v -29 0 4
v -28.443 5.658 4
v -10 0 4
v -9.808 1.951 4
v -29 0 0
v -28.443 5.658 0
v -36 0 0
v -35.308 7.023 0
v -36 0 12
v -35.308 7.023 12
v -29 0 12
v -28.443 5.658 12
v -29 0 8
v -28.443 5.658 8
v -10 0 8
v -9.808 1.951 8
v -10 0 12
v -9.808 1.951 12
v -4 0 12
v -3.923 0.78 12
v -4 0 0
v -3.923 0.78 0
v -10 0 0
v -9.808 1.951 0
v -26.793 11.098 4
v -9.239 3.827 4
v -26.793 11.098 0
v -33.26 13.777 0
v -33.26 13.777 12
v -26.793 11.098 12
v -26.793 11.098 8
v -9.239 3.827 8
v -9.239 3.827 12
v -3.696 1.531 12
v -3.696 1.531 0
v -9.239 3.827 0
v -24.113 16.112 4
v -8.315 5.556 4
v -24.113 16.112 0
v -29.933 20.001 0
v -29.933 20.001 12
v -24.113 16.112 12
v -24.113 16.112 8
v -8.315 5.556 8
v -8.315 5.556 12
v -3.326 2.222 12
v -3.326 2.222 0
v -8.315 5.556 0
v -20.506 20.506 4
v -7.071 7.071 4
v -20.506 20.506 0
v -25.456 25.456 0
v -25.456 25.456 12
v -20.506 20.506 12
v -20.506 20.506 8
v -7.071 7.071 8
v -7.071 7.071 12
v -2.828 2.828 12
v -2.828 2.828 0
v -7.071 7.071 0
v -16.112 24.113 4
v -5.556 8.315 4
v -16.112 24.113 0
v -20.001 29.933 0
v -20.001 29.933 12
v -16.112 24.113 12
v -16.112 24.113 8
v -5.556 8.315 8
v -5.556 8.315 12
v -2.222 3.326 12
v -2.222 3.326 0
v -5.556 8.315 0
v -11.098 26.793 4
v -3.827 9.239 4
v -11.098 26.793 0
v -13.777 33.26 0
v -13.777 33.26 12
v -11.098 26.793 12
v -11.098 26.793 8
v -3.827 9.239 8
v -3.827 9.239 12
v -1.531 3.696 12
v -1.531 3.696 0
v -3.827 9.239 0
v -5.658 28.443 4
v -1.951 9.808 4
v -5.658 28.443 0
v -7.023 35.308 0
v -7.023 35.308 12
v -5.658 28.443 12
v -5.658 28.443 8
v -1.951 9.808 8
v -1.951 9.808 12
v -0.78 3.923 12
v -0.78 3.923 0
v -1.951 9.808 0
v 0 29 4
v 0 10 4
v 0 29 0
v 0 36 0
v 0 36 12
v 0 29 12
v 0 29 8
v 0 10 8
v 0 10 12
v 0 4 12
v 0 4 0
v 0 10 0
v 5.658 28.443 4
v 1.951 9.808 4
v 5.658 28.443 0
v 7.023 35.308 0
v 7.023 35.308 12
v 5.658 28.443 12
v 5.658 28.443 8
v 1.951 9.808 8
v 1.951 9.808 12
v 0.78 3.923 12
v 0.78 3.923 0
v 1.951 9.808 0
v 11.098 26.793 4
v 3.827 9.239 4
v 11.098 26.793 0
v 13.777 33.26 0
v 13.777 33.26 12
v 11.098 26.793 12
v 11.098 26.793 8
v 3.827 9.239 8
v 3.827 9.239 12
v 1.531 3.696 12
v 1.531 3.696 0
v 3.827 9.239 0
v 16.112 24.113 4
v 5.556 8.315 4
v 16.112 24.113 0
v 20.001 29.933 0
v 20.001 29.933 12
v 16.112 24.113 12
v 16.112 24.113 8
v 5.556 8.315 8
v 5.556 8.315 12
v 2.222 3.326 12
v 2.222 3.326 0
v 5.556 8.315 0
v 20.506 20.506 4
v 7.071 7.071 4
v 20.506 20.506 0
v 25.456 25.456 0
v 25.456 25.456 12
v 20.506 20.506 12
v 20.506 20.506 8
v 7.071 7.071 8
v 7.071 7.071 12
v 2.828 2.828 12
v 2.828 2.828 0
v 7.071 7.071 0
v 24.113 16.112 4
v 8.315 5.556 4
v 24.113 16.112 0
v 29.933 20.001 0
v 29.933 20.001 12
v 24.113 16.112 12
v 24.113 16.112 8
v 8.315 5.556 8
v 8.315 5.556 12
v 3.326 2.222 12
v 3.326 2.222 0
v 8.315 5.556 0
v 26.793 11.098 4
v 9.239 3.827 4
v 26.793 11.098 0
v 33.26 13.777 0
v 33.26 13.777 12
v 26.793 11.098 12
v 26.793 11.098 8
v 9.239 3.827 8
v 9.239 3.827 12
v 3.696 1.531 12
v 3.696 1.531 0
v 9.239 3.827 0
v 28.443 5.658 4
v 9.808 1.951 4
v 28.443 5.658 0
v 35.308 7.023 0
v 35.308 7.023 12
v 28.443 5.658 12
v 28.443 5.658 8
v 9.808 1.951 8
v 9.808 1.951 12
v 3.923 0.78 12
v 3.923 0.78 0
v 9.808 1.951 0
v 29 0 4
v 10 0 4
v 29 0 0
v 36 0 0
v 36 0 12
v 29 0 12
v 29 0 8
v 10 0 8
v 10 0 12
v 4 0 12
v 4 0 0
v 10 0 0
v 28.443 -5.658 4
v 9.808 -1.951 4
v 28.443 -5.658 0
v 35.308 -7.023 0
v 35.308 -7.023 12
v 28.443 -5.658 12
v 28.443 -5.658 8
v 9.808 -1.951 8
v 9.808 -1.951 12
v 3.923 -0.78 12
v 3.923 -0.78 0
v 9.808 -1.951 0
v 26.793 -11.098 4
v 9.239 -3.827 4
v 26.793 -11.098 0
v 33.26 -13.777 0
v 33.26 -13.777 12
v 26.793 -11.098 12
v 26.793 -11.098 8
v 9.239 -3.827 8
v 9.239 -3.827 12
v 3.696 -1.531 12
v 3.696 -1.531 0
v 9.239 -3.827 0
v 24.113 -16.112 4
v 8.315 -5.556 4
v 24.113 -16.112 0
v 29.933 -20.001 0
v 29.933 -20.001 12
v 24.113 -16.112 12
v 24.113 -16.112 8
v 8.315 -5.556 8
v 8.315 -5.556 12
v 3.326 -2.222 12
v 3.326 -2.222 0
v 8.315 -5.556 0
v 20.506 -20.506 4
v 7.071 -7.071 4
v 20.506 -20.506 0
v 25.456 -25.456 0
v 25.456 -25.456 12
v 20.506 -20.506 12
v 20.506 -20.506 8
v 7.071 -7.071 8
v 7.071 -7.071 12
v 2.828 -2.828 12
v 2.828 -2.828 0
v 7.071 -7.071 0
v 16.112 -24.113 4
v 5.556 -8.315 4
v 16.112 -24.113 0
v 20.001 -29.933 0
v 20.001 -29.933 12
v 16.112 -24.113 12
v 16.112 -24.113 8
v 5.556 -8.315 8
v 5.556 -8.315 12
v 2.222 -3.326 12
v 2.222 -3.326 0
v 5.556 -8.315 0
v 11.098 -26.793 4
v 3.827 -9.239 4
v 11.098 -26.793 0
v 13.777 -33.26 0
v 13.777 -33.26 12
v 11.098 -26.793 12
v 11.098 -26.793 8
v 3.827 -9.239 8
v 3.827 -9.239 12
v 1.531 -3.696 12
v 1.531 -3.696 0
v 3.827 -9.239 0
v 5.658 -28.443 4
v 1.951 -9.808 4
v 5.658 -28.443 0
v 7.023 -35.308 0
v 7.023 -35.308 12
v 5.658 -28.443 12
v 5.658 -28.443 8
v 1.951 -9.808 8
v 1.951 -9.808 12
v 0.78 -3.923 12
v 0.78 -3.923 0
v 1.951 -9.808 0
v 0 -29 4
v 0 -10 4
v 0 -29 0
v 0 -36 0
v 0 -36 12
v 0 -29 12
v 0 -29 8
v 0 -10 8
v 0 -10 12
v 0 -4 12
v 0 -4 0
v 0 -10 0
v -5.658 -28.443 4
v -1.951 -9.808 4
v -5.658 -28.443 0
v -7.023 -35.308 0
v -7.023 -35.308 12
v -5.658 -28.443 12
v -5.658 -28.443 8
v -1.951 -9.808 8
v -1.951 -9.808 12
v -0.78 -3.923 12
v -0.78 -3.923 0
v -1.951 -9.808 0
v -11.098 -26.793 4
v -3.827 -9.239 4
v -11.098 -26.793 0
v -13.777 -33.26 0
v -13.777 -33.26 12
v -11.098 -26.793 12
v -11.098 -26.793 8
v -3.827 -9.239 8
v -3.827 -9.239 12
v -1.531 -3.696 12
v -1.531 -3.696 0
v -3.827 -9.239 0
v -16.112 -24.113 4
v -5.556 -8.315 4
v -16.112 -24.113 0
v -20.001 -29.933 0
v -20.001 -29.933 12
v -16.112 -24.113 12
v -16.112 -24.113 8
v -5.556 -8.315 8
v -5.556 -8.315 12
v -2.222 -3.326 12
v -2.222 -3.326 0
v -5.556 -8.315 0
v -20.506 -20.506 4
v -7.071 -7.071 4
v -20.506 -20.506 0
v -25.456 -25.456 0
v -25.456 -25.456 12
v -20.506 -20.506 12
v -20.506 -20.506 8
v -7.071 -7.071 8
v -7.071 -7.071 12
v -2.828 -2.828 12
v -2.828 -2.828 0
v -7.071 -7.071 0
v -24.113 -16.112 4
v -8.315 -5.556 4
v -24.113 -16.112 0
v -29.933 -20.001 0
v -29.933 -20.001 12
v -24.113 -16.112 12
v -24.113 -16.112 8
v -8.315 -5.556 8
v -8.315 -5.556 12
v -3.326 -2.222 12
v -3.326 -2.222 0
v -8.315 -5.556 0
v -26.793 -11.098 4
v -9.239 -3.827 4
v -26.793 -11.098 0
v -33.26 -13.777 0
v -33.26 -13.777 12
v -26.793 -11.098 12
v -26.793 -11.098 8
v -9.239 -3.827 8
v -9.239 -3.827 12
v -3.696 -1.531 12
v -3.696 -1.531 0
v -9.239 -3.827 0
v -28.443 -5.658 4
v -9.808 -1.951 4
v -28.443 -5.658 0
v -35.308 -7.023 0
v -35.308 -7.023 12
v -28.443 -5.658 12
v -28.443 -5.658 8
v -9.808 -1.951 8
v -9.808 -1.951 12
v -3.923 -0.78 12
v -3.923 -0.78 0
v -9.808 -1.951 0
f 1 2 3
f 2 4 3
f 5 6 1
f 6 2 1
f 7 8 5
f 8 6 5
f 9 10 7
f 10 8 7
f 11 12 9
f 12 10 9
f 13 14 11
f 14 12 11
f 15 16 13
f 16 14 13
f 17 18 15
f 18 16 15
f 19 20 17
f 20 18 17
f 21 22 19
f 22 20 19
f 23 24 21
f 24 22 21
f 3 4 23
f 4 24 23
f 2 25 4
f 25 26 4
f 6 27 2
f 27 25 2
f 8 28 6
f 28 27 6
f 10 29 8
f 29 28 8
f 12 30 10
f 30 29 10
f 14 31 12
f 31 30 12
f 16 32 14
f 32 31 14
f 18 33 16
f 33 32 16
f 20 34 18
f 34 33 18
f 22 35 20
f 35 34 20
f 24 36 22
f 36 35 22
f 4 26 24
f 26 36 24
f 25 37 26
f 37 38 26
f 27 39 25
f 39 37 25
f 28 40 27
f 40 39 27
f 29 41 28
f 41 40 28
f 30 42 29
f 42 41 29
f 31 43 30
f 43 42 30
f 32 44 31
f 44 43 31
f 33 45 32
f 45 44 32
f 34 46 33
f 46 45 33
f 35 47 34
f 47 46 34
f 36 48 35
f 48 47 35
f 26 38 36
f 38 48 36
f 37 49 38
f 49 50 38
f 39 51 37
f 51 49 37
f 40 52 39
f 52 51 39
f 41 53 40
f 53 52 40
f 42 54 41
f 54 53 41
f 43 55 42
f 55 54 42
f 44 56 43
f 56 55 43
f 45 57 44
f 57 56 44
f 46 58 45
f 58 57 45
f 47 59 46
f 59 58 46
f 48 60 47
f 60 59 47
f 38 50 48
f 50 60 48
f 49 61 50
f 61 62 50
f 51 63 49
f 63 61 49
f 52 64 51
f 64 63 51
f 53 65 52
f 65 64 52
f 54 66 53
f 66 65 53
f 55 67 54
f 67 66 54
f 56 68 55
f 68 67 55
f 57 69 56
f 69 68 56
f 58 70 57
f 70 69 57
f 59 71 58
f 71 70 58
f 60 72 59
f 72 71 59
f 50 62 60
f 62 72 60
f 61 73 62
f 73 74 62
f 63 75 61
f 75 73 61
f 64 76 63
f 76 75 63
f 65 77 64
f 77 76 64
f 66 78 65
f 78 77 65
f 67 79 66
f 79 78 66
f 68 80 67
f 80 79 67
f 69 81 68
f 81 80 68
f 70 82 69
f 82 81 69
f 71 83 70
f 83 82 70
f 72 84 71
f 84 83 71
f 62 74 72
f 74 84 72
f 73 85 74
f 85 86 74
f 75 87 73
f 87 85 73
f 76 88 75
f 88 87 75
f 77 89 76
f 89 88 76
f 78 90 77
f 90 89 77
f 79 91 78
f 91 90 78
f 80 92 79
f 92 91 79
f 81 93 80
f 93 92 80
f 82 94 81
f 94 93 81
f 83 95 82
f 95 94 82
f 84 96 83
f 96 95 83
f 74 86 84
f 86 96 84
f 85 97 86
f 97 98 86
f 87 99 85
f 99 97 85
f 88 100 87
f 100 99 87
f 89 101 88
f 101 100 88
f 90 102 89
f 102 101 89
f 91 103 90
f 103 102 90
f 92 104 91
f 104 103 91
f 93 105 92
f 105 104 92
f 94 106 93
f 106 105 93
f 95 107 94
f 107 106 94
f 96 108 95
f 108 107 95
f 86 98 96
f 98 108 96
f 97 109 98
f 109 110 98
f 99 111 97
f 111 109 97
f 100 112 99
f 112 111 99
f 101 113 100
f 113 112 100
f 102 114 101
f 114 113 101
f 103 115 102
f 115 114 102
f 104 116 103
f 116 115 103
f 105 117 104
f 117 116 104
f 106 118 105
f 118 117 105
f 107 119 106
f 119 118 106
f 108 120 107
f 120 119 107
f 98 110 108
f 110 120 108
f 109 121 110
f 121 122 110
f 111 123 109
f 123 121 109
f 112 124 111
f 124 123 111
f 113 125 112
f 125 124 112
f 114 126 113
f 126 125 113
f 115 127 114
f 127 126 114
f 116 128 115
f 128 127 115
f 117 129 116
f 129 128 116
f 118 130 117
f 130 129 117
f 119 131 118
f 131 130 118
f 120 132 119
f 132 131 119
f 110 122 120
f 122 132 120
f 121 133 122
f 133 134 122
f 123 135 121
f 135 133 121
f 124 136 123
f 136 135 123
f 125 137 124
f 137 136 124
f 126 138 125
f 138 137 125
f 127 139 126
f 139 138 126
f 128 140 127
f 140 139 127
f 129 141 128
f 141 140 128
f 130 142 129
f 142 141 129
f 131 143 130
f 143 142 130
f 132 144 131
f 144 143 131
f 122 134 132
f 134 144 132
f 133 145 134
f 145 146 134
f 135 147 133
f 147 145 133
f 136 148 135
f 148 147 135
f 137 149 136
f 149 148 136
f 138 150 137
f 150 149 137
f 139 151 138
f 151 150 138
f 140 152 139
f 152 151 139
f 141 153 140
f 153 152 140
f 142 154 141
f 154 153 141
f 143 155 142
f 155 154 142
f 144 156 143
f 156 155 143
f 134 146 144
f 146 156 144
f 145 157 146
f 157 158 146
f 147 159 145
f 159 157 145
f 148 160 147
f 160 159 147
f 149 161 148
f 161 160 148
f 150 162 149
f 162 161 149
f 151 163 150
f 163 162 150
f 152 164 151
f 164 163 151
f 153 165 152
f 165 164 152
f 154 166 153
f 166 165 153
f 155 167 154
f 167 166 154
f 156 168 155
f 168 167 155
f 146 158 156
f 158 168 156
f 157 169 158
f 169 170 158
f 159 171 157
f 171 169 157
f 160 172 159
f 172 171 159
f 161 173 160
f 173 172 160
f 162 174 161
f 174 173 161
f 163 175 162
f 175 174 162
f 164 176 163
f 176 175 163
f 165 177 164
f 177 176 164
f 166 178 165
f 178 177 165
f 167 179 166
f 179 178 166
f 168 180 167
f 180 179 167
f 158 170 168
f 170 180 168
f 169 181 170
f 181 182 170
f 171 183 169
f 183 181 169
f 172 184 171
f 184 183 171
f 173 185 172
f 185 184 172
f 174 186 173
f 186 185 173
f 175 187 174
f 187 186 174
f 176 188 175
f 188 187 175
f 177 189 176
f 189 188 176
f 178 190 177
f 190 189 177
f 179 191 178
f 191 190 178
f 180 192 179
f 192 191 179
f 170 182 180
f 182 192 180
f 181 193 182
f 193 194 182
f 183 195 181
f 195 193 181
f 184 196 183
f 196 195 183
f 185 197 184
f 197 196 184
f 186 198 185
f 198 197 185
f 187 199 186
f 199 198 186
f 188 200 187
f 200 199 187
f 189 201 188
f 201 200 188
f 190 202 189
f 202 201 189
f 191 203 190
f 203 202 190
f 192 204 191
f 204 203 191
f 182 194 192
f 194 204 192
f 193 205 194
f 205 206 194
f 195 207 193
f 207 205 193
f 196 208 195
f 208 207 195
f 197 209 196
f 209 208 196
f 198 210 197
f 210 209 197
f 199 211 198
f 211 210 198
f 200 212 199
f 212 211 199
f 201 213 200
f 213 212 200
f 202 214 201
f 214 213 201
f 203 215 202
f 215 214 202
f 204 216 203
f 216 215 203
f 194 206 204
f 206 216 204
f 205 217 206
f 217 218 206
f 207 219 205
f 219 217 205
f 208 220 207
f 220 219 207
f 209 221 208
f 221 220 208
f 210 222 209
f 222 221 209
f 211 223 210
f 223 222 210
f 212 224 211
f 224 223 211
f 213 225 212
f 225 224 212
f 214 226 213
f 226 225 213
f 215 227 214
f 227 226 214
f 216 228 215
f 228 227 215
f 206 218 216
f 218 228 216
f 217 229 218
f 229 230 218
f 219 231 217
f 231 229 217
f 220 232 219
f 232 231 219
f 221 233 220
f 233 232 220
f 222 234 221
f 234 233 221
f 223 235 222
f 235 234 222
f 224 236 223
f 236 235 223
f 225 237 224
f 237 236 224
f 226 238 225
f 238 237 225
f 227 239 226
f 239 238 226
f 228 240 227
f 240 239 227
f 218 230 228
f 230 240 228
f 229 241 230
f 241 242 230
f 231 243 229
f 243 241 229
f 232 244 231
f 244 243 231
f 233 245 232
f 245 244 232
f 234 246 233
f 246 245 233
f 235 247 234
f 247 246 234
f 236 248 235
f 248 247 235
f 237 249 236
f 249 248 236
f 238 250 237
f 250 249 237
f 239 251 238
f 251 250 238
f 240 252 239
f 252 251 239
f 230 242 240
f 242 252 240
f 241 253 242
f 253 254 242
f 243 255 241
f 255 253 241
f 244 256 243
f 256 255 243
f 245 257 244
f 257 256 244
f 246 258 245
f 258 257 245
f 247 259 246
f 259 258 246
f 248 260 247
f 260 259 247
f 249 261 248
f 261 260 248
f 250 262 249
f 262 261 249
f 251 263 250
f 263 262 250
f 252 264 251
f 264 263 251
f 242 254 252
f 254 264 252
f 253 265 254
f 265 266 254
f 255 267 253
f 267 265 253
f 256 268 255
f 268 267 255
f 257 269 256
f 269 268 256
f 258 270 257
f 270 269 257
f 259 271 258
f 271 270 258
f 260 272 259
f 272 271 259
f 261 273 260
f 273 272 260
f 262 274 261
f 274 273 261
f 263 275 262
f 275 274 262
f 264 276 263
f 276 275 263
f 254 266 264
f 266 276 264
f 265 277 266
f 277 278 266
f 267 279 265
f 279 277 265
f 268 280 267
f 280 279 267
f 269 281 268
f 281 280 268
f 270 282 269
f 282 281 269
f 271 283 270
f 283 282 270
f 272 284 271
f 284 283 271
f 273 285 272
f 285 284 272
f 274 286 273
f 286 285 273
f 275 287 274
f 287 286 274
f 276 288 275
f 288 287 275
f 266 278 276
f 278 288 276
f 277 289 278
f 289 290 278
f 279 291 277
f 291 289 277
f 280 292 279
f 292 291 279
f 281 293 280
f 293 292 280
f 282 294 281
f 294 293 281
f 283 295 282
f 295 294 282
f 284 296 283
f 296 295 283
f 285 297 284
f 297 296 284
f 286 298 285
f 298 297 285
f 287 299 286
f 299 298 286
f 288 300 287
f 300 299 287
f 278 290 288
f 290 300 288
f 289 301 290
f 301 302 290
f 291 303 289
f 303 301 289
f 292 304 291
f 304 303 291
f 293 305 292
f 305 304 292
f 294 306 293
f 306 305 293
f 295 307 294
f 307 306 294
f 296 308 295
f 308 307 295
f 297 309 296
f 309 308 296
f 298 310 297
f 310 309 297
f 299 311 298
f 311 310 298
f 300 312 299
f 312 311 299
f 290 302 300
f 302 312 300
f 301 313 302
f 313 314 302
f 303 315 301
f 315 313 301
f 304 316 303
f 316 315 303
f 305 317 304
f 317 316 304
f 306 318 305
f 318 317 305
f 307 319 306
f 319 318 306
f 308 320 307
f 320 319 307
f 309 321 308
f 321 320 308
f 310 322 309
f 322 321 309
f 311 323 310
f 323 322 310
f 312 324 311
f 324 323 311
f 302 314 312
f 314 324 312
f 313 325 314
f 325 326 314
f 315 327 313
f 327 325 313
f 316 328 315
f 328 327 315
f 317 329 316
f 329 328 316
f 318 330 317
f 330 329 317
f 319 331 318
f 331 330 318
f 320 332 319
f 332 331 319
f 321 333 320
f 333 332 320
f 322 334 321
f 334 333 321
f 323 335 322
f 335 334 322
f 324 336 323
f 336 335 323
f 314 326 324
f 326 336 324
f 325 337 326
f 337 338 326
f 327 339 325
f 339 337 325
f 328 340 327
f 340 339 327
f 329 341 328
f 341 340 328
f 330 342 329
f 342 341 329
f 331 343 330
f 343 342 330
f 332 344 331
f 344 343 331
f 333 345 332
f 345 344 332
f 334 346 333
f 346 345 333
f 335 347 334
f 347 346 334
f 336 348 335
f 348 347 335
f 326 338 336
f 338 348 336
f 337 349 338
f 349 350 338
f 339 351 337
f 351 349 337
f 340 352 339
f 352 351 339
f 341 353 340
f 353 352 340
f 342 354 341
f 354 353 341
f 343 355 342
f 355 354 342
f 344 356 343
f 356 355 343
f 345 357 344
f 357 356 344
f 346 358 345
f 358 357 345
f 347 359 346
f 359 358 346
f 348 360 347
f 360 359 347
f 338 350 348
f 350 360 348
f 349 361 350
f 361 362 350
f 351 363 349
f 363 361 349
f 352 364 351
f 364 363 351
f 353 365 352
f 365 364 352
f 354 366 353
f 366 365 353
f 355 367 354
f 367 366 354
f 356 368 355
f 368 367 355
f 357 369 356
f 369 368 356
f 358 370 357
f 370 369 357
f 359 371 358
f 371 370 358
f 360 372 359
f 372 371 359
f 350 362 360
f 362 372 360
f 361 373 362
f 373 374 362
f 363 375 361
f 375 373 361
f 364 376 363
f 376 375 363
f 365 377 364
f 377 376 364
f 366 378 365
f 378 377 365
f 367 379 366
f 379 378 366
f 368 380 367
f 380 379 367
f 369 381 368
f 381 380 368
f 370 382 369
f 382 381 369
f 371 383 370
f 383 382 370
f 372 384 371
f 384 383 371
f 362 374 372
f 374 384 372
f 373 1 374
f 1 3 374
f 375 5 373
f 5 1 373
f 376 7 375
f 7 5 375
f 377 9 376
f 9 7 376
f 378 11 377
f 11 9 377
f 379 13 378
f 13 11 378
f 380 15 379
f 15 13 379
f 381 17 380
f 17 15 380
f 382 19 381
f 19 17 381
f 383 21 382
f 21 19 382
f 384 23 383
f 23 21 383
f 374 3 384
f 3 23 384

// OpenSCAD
$fn = 32;

// ----------------------------------------------------------------------
// Revolved part: handwheel R36
// ----------------------------------------------------------------------

// --- parameters (mm) ---
bore_r = 4;               // bore radius
rim_r = 36;               // rim radius
rim_w = 7;                // rim axial width
rim_t = 12;               // rim diameter height
hub_r = 10;               // hub radius
web_t = 4;                // web thickness
revolve_angle = 360;      // revolve sweep, degrees

bore_d = 2 * bore_r;
rim_d = 2 * rim_r;
hub_d = 2 * hub_r;

profile = [[4, 0], [10, 0], [10, 4], [29, 4], [29, 0], [36, 0], [36, 12], [29, 12], [29, 8], [10, 8], [10, 12], [4, 12]];  // primary outline, 12 points, counter clockwise

// --- the one profile operation ---
rotate_extrude(angle = revolve_angle) polygon(points = profile);
